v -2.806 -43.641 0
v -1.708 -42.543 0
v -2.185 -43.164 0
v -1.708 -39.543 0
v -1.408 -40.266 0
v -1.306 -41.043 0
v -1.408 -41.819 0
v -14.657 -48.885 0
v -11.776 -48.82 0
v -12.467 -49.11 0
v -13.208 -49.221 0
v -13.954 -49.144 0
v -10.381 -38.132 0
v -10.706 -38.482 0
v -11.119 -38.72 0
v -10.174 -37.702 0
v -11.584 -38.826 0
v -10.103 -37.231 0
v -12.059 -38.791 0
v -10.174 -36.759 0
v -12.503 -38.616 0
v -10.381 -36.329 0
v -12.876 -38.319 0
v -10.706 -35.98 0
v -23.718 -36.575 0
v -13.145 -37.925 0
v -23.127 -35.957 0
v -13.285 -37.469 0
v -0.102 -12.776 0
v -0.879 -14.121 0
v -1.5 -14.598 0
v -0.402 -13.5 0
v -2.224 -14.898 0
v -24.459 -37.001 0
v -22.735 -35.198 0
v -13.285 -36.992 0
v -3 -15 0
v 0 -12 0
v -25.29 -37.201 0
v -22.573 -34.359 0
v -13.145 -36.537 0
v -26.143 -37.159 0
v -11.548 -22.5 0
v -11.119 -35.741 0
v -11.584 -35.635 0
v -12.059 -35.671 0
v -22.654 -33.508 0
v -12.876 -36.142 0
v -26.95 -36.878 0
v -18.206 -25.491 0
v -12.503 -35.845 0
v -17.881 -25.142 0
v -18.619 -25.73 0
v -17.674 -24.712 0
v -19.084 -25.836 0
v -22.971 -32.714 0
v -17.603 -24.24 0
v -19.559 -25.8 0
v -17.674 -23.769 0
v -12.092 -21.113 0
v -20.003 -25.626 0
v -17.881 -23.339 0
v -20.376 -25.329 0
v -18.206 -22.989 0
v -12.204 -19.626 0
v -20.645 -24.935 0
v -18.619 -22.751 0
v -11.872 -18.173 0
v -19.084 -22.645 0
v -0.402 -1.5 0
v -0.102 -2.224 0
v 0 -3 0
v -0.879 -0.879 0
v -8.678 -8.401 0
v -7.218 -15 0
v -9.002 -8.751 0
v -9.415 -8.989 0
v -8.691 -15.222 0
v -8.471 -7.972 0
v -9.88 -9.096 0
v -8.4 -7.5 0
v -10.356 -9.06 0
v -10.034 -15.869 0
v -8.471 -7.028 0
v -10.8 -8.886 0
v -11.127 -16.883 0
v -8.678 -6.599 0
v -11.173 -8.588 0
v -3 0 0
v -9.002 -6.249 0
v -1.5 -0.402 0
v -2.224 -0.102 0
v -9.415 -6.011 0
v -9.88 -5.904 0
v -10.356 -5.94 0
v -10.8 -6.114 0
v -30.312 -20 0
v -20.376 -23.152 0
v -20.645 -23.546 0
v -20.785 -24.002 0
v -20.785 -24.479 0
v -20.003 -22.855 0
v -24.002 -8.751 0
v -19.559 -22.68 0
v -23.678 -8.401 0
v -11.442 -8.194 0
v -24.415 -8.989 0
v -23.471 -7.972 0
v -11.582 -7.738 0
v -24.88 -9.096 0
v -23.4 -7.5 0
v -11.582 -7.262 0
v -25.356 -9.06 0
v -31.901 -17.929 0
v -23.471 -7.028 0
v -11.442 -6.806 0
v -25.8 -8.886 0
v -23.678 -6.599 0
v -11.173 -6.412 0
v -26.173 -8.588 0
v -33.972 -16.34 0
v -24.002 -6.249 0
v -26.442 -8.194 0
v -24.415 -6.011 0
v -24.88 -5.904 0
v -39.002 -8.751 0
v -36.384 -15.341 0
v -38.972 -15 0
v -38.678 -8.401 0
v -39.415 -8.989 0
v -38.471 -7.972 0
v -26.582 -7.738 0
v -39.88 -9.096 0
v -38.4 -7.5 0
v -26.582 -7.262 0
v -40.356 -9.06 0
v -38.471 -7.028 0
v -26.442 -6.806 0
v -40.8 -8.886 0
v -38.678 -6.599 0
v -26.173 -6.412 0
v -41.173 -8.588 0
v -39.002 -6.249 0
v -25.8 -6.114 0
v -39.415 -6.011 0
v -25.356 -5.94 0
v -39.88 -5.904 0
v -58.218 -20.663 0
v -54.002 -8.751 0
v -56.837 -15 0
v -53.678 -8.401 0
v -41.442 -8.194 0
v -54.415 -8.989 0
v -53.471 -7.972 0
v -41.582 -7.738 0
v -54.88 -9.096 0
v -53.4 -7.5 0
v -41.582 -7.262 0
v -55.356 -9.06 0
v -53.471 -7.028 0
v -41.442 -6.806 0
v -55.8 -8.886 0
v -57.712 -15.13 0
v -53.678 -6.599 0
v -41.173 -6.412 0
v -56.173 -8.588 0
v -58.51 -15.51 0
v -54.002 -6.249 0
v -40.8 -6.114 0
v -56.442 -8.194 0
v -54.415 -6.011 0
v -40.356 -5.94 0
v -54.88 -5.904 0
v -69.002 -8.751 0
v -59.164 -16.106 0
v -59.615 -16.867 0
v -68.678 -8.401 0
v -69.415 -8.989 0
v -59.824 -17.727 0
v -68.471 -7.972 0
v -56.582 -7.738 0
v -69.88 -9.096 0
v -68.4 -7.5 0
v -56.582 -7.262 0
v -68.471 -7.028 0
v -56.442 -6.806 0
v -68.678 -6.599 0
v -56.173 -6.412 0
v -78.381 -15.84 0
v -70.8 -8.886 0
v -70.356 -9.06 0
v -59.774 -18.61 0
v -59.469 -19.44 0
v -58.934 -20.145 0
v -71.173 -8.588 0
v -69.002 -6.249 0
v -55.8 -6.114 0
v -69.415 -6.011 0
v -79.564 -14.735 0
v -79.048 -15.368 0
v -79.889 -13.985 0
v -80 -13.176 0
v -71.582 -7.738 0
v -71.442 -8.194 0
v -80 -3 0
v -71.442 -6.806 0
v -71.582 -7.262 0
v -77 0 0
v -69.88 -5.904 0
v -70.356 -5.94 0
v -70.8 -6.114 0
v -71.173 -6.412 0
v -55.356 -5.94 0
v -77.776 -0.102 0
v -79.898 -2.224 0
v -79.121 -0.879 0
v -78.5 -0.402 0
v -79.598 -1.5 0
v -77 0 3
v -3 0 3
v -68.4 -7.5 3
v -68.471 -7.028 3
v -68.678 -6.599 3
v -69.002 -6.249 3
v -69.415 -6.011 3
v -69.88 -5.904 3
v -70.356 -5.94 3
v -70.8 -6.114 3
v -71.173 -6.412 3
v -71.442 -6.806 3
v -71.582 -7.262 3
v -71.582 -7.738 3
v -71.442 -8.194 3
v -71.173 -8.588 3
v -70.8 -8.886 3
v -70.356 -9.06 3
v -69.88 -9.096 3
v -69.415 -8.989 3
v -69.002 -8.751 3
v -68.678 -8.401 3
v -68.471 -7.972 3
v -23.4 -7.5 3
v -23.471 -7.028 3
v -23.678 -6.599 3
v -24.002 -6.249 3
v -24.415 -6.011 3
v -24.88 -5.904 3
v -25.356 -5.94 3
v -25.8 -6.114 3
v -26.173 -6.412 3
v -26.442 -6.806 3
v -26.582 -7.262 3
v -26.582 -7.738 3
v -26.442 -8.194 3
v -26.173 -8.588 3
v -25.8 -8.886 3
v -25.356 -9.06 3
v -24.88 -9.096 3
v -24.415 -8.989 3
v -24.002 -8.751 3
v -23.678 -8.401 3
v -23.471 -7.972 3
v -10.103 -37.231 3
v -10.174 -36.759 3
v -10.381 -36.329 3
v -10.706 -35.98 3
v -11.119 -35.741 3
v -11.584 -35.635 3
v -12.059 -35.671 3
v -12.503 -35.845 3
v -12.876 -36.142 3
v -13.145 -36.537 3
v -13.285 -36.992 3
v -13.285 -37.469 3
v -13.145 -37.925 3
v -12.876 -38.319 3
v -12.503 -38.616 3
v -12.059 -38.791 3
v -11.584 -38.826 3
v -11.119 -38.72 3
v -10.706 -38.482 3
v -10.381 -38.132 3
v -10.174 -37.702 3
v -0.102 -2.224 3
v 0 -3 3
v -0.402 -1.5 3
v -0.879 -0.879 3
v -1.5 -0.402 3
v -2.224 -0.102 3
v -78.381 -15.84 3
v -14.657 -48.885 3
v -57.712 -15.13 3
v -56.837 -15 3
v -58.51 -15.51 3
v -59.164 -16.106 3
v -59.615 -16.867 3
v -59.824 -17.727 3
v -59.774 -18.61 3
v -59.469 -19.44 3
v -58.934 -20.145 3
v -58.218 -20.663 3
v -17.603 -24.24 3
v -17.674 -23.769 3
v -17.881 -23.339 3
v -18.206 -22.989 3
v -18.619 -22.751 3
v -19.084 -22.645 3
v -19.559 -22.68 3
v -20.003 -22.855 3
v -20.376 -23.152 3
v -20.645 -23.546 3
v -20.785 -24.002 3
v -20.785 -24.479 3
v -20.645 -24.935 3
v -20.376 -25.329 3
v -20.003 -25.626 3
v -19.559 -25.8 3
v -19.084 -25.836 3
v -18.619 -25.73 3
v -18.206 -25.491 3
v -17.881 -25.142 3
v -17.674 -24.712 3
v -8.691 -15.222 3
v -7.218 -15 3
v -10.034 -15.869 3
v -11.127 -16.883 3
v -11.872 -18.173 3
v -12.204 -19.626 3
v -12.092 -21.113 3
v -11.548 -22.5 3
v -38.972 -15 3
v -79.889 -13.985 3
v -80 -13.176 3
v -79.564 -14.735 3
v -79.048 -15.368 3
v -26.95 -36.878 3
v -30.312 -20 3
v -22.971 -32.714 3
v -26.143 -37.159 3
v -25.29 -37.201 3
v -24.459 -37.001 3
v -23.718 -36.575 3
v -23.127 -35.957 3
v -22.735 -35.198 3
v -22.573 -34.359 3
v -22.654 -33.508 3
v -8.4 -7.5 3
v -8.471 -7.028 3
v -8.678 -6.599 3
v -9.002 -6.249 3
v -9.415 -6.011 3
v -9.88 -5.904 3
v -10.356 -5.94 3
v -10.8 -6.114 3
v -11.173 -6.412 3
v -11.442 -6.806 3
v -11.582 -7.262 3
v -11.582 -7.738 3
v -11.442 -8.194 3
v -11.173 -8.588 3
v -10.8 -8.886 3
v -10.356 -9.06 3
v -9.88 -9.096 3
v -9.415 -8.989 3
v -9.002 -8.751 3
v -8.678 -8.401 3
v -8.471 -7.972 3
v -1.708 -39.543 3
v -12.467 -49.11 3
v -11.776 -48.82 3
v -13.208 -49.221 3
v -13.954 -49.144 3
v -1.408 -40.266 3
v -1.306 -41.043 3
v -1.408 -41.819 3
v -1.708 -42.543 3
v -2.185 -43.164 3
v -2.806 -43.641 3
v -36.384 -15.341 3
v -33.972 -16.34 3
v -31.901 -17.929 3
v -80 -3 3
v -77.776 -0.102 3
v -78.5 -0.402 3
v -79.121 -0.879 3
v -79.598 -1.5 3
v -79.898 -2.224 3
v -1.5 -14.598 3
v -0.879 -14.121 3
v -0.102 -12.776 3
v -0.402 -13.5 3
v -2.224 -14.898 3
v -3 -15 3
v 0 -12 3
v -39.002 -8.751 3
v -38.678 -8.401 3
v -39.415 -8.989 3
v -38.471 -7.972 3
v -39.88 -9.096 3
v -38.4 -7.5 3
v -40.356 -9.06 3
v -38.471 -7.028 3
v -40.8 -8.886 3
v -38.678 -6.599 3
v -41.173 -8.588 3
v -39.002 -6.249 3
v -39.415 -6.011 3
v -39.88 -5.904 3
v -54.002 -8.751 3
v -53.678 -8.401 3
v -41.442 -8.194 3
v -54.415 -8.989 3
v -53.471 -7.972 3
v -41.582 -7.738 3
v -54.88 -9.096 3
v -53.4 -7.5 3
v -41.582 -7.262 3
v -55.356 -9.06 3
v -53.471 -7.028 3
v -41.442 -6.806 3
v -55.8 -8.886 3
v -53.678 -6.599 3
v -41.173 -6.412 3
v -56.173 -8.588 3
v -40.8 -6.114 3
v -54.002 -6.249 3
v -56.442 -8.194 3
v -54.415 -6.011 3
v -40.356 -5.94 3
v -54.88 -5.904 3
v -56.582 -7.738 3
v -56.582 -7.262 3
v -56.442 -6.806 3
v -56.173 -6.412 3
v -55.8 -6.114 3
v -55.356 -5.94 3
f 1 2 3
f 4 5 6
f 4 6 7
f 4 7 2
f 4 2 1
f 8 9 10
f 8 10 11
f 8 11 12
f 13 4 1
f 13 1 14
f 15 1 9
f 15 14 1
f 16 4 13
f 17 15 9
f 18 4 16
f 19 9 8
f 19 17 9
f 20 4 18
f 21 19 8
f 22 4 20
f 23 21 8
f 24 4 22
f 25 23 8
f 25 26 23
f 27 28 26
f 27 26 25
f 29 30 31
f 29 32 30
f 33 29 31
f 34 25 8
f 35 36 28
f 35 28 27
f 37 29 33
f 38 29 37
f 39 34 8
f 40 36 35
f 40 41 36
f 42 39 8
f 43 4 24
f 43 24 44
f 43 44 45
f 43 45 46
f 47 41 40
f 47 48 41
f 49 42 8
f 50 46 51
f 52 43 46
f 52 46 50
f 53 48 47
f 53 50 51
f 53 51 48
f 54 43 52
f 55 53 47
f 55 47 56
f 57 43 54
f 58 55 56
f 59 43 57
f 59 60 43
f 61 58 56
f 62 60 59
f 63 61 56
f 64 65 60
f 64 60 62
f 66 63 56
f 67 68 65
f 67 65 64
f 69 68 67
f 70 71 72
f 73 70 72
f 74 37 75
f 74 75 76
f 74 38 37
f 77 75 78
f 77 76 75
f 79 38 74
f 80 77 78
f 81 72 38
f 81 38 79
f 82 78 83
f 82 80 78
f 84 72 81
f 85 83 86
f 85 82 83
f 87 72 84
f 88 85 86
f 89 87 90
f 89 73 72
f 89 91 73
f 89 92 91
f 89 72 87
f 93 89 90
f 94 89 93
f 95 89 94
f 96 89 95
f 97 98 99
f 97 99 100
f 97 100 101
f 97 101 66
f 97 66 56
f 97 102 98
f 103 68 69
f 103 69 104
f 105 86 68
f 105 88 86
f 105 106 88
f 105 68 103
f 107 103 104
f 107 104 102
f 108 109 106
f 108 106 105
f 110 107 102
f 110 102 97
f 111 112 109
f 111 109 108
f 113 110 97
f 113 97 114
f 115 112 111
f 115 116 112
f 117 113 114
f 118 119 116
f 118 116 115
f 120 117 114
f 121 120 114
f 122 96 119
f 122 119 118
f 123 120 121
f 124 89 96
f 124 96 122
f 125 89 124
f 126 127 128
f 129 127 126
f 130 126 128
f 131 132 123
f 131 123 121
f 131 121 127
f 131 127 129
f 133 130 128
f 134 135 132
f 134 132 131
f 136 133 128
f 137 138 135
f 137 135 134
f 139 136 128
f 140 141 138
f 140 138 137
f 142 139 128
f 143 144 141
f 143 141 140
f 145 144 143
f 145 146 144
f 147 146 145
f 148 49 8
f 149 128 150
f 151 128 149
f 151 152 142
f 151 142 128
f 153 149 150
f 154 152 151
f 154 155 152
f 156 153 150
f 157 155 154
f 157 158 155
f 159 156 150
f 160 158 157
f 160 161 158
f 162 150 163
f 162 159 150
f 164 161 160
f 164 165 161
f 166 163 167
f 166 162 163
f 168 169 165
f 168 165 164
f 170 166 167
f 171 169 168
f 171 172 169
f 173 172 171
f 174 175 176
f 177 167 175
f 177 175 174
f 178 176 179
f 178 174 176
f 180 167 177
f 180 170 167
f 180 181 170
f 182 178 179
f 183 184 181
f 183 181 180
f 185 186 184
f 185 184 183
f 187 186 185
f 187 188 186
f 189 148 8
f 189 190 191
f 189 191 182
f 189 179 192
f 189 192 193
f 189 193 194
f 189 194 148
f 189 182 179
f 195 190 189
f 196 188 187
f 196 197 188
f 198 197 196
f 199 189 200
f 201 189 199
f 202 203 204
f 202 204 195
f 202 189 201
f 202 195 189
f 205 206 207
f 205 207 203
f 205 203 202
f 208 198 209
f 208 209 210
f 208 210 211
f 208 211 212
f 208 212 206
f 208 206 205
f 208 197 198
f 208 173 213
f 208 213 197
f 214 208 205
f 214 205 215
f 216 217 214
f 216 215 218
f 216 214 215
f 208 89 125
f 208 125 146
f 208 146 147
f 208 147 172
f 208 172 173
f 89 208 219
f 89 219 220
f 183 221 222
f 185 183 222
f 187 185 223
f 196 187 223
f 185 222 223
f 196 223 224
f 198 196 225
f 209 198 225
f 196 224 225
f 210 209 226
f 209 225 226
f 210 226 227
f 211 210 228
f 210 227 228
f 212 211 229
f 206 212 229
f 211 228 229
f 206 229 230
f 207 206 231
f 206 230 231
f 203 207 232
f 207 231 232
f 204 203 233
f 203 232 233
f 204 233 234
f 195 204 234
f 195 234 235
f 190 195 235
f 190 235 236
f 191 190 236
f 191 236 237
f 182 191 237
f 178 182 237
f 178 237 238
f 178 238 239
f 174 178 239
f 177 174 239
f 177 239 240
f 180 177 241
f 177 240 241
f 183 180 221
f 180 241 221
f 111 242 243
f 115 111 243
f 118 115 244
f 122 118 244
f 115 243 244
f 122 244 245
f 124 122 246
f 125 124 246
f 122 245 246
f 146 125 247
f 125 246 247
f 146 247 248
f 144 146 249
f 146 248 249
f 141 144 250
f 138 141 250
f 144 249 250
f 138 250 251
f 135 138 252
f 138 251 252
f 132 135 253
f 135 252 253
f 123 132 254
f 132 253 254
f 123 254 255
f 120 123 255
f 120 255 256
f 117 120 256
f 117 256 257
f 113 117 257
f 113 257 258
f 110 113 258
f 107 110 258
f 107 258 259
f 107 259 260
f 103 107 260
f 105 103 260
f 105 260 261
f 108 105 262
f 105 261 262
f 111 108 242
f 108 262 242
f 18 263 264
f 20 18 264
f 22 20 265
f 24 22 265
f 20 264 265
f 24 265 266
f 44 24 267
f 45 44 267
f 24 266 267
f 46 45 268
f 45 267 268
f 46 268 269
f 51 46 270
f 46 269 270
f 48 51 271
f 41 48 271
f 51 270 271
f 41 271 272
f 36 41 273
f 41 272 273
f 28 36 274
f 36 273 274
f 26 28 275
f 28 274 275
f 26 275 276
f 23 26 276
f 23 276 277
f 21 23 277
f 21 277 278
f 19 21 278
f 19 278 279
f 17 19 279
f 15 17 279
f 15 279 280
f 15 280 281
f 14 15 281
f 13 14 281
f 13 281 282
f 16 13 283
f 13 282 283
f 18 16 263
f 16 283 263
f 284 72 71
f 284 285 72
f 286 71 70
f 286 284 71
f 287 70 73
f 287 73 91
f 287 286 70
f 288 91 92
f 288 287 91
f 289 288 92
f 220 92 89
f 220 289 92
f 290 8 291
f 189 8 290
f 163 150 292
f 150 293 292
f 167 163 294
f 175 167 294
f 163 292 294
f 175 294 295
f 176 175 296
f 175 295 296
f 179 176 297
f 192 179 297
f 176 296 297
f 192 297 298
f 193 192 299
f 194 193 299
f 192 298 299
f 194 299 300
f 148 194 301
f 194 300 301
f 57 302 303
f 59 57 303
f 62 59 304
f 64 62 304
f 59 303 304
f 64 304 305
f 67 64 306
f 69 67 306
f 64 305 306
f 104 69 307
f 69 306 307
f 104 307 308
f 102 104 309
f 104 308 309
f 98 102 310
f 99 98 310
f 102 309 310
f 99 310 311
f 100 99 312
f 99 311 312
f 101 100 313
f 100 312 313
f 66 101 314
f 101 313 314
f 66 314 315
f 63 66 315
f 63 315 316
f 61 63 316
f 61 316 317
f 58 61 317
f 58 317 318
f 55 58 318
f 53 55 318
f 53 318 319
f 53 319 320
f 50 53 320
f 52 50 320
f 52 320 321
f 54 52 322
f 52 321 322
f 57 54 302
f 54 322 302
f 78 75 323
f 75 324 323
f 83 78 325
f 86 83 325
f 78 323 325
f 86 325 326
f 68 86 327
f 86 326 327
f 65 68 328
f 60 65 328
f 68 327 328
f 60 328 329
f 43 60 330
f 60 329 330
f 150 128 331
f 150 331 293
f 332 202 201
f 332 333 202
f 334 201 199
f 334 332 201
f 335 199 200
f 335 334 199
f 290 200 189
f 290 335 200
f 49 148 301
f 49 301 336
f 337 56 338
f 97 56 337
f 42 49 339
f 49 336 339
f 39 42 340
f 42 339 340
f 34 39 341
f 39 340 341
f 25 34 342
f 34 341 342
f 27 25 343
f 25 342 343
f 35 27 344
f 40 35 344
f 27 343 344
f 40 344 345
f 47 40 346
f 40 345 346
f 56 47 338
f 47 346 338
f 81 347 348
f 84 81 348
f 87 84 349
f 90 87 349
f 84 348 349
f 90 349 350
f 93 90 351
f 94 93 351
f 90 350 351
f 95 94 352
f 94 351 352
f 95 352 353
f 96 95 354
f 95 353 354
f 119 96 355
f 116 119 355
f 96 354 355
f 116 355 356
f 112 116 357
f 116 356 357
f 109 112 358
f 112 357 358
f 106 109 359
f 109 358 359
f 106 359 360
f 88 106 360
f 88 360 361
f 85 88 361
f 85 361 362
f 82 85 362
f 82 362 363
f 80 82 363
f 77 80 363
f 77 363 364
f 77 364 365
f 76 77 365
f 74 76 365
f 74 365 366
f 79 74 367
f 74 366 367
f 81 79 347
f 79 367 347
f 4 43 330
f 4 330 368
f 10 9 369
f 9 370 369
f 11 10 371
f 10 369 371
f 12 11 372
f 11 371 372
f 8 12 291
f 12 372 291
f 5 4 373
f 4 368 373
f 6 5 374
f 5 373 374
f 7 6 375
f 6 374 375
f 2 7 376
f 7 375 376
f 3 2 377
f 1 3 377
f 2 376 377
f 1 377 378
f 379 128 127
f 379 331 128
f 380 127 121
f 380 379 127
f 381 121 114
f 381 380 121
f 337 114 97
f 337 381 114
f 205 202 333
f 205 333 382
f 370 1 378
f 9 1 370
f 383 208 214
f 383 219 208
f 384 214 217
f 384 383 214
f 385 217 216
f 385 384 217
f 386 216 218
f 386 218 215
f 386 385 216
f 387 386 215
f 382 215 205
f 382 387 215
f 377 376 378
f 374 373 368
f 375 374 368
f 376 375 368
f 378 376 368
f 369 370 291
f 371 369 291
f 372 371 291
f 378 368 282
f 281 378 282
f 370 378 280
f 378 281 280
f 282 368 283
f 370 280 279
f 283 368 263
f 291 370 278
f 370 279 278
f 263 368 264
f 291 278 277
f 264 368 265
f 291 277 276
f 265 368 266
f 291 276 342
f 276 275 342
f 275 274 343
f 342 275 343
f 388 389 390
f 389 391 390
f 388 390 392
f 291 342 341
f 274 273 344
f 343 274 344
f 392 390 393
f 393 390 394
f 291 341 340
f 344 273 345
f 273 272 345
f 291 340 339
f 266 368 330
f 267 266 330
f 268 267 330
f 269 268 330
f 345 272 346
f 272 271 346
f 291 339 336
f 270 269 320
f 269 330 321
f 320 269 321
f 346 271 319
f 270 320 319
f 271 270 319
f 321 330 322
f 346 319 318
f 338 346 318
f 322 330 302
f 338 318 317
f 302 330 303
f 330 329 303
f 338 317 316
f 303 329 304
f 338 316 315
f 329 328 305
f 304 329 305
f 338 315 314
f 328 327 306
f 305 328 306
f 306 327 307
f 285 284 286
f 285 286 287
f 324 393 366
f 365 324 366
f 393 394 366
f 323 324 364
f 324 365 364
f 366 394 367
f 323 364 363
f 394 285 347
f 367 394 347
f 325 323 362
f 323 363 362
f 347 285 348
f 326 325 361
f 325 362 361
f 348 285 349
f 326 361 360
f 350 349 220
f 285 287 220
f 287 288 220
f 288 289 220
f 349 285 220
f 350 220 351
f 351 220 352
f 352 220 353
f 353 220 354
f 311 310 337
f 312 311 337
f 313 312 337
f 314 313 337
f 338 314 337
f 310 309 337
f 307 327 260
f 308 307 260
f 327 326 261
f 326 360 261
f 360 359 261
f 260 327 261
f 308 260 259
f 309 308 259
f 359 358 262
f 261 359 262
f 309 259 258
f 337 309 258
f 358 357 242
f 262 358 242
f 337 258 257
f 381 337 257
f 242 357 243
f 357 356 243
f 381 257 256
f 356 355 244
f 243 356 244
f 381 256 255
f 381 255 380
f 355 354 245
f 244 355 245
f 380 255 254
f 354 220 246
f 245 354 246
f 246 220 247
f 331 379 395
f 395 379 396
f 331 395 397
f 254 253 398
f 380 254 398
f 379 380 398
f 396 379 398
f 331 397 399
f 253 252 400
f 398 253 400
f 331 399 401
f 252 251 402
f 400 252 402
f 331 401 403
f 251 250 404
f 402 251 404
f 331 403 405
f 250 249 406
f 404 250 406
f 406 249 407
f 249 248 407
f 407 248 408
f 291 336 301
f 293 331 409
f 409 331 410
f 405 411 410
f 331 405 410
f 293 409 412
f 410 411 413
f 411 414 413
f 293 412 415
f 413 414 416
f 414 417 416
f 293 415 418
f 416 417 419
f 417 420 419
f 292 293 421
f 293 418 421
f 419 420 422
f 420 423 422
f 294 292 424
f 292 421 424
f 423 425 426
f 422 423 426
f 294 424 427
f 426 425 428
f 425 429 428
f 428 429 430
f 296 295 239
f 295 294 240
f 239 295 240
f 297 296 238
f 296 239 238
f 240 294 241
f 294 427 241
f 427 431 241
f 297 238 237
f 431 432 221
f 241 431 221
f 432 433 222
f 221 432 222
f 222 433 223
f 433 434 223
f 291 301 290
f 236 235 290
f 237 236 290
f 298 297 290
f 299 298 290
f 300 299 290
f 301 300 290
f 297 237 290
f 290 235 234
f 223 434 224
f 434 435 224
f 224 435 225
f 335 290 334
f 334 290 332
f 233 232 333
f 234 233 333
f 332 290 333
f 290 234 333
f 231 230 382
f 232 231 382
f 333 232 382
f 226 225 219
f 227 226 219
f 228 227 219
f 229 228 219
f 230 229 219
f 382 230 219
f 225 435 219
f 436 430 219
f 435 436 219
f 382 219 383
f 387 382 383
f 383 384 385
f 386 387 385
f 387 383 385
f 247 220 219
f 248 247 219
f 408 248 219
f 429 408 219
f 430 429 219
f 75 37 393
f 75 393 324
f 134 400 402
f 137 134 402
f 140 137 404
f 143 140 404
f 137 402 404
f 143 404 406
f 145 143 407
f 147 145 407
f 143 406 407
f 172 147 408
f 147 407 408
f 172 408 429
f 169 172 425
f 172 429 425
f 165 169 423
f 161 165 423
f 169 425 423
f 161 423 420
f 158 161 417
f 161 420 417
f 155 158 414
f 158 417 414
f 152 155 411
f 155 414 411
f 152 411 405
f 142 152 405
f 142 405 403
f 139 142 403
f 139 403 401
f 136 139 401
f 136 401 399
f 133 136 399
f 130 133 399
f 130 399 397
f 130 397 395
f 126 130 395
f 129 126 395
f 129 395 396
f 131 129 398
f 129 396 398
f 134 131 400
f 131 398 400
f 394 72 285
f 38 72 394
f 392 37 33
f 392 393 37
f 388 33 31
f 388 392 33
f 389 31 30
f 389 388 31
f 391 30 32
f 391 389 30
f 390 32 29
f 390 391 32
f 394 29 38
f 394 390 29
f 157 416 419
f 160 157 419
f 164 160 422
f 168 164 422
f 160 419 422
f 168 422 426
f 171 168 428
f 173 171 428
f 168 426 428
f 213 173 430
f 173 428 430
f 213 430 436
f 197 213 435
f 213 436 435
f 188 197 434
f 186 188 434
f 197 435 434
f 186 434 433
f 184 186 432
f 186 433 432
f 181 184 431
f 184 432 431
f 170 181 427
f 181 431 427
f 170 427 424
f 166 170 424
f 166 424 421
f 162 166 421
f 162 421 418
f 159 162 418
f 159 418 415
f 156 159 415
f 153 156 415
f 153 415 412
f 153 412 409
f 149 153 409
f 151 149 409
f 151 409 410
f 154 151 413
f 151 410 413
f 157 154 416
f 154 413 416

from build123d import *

# Parameters (mm, degrees)
EXTRUDE_1_DEPTH     = 3
FILLET_1_R          = 5
FILLET_2_R          = 10
FILLET_3_R          = 3
SKETCH_2_R          = 1.6
CUT_EXTRUDE_1_DEPTH = 3
FILLET_4_R          = 3


with BuildPart() as part:
    # 草图1 → 凸台-拉伸1 (new body)
    with BuildSketch(Plane.XY):
        Polygon((0, -15), (-15.87797303, -15), (-0.208100049, -42.141016151), (-13.198481106, -49.641016151), (-80, -15), (-80, 0), (0, 0), align=None)
        Polygon((-17.839906221, -41.601832032), (-33.198481106, -15), (-69.138712739, -15), align=None, mode=Mode.SUBTRACT)
    extrude(amount=EXTRUDE_1_DEPTH)

    # 圆角1
    fillet_1_edges = [part.edges().sort_by_distance(p)[0] for p in [
        (-15.87797303, -15, 1.5),
    ]]
    fillet(fillet_1_edges, radius=FILLET_1_R)

    # 圆角2
    fillet_2_edges = [part.edges().sort_by_distance(p)[0] for p in [
        (-33.198481106, -15, 1.5),
    ]]
    fillet(fillet_2_edges, radius=FILLET_2_R)

    # 圆角3
    fillet_3_edges = [part.edges().sort_by_distance(p)[0] for p in [
        (0, -15, 1.5),
        (-0.208100049, -42.141016151, 1.5),
        (-13.198481106, -49.641016151, 1.5),
        (-80, -15, 1.5),
        (-80, 0, 1.5),
        (0, 0, 1.5),
    ]]
    fillet(fillet_3_edges, radius=FILLET_3_R)

    # 草图2 → 切除-拉伸1 (cut)
    with BuildSketch(Plane.XY.offset(3)):
        with Locations((-11.703290577, -37.230762114)):
            Circle(SKETCH_2_R)
        with Locations((-19.203290577, -24.240381057)):
            Circle(SKETCH_2_R)
        with Locations((-10, -7.5)):
            Circle(SKETCH_2_R)
        with Locations((-25, -7.5)):
            Circle(SKETCH_2_R)
        with Locations((-40, -7.5)):
            Circle(SKETCH_2_R)
        with Locations((-55, -7.5)):
            Circle(SKETCH_2_R)
        with Locations((-70, -7.5)):
            Circle(SKETCH_2_R)
    extrude(amount=-CUT_EXTRUDE_1_DEPTH, mode=Mode.SUBTRACT)

    # 圆角4
    fillet_4_edges = [part.edges().sort_by_distance(p)[0] for p in [
        (-69.138712739, -15, 1.5),
        (-17.839906221, -41.601832032, 1.5),
    ]]
    fillet(fillet_4_edges, radius=FILLET_4_R)


solid = part.part
